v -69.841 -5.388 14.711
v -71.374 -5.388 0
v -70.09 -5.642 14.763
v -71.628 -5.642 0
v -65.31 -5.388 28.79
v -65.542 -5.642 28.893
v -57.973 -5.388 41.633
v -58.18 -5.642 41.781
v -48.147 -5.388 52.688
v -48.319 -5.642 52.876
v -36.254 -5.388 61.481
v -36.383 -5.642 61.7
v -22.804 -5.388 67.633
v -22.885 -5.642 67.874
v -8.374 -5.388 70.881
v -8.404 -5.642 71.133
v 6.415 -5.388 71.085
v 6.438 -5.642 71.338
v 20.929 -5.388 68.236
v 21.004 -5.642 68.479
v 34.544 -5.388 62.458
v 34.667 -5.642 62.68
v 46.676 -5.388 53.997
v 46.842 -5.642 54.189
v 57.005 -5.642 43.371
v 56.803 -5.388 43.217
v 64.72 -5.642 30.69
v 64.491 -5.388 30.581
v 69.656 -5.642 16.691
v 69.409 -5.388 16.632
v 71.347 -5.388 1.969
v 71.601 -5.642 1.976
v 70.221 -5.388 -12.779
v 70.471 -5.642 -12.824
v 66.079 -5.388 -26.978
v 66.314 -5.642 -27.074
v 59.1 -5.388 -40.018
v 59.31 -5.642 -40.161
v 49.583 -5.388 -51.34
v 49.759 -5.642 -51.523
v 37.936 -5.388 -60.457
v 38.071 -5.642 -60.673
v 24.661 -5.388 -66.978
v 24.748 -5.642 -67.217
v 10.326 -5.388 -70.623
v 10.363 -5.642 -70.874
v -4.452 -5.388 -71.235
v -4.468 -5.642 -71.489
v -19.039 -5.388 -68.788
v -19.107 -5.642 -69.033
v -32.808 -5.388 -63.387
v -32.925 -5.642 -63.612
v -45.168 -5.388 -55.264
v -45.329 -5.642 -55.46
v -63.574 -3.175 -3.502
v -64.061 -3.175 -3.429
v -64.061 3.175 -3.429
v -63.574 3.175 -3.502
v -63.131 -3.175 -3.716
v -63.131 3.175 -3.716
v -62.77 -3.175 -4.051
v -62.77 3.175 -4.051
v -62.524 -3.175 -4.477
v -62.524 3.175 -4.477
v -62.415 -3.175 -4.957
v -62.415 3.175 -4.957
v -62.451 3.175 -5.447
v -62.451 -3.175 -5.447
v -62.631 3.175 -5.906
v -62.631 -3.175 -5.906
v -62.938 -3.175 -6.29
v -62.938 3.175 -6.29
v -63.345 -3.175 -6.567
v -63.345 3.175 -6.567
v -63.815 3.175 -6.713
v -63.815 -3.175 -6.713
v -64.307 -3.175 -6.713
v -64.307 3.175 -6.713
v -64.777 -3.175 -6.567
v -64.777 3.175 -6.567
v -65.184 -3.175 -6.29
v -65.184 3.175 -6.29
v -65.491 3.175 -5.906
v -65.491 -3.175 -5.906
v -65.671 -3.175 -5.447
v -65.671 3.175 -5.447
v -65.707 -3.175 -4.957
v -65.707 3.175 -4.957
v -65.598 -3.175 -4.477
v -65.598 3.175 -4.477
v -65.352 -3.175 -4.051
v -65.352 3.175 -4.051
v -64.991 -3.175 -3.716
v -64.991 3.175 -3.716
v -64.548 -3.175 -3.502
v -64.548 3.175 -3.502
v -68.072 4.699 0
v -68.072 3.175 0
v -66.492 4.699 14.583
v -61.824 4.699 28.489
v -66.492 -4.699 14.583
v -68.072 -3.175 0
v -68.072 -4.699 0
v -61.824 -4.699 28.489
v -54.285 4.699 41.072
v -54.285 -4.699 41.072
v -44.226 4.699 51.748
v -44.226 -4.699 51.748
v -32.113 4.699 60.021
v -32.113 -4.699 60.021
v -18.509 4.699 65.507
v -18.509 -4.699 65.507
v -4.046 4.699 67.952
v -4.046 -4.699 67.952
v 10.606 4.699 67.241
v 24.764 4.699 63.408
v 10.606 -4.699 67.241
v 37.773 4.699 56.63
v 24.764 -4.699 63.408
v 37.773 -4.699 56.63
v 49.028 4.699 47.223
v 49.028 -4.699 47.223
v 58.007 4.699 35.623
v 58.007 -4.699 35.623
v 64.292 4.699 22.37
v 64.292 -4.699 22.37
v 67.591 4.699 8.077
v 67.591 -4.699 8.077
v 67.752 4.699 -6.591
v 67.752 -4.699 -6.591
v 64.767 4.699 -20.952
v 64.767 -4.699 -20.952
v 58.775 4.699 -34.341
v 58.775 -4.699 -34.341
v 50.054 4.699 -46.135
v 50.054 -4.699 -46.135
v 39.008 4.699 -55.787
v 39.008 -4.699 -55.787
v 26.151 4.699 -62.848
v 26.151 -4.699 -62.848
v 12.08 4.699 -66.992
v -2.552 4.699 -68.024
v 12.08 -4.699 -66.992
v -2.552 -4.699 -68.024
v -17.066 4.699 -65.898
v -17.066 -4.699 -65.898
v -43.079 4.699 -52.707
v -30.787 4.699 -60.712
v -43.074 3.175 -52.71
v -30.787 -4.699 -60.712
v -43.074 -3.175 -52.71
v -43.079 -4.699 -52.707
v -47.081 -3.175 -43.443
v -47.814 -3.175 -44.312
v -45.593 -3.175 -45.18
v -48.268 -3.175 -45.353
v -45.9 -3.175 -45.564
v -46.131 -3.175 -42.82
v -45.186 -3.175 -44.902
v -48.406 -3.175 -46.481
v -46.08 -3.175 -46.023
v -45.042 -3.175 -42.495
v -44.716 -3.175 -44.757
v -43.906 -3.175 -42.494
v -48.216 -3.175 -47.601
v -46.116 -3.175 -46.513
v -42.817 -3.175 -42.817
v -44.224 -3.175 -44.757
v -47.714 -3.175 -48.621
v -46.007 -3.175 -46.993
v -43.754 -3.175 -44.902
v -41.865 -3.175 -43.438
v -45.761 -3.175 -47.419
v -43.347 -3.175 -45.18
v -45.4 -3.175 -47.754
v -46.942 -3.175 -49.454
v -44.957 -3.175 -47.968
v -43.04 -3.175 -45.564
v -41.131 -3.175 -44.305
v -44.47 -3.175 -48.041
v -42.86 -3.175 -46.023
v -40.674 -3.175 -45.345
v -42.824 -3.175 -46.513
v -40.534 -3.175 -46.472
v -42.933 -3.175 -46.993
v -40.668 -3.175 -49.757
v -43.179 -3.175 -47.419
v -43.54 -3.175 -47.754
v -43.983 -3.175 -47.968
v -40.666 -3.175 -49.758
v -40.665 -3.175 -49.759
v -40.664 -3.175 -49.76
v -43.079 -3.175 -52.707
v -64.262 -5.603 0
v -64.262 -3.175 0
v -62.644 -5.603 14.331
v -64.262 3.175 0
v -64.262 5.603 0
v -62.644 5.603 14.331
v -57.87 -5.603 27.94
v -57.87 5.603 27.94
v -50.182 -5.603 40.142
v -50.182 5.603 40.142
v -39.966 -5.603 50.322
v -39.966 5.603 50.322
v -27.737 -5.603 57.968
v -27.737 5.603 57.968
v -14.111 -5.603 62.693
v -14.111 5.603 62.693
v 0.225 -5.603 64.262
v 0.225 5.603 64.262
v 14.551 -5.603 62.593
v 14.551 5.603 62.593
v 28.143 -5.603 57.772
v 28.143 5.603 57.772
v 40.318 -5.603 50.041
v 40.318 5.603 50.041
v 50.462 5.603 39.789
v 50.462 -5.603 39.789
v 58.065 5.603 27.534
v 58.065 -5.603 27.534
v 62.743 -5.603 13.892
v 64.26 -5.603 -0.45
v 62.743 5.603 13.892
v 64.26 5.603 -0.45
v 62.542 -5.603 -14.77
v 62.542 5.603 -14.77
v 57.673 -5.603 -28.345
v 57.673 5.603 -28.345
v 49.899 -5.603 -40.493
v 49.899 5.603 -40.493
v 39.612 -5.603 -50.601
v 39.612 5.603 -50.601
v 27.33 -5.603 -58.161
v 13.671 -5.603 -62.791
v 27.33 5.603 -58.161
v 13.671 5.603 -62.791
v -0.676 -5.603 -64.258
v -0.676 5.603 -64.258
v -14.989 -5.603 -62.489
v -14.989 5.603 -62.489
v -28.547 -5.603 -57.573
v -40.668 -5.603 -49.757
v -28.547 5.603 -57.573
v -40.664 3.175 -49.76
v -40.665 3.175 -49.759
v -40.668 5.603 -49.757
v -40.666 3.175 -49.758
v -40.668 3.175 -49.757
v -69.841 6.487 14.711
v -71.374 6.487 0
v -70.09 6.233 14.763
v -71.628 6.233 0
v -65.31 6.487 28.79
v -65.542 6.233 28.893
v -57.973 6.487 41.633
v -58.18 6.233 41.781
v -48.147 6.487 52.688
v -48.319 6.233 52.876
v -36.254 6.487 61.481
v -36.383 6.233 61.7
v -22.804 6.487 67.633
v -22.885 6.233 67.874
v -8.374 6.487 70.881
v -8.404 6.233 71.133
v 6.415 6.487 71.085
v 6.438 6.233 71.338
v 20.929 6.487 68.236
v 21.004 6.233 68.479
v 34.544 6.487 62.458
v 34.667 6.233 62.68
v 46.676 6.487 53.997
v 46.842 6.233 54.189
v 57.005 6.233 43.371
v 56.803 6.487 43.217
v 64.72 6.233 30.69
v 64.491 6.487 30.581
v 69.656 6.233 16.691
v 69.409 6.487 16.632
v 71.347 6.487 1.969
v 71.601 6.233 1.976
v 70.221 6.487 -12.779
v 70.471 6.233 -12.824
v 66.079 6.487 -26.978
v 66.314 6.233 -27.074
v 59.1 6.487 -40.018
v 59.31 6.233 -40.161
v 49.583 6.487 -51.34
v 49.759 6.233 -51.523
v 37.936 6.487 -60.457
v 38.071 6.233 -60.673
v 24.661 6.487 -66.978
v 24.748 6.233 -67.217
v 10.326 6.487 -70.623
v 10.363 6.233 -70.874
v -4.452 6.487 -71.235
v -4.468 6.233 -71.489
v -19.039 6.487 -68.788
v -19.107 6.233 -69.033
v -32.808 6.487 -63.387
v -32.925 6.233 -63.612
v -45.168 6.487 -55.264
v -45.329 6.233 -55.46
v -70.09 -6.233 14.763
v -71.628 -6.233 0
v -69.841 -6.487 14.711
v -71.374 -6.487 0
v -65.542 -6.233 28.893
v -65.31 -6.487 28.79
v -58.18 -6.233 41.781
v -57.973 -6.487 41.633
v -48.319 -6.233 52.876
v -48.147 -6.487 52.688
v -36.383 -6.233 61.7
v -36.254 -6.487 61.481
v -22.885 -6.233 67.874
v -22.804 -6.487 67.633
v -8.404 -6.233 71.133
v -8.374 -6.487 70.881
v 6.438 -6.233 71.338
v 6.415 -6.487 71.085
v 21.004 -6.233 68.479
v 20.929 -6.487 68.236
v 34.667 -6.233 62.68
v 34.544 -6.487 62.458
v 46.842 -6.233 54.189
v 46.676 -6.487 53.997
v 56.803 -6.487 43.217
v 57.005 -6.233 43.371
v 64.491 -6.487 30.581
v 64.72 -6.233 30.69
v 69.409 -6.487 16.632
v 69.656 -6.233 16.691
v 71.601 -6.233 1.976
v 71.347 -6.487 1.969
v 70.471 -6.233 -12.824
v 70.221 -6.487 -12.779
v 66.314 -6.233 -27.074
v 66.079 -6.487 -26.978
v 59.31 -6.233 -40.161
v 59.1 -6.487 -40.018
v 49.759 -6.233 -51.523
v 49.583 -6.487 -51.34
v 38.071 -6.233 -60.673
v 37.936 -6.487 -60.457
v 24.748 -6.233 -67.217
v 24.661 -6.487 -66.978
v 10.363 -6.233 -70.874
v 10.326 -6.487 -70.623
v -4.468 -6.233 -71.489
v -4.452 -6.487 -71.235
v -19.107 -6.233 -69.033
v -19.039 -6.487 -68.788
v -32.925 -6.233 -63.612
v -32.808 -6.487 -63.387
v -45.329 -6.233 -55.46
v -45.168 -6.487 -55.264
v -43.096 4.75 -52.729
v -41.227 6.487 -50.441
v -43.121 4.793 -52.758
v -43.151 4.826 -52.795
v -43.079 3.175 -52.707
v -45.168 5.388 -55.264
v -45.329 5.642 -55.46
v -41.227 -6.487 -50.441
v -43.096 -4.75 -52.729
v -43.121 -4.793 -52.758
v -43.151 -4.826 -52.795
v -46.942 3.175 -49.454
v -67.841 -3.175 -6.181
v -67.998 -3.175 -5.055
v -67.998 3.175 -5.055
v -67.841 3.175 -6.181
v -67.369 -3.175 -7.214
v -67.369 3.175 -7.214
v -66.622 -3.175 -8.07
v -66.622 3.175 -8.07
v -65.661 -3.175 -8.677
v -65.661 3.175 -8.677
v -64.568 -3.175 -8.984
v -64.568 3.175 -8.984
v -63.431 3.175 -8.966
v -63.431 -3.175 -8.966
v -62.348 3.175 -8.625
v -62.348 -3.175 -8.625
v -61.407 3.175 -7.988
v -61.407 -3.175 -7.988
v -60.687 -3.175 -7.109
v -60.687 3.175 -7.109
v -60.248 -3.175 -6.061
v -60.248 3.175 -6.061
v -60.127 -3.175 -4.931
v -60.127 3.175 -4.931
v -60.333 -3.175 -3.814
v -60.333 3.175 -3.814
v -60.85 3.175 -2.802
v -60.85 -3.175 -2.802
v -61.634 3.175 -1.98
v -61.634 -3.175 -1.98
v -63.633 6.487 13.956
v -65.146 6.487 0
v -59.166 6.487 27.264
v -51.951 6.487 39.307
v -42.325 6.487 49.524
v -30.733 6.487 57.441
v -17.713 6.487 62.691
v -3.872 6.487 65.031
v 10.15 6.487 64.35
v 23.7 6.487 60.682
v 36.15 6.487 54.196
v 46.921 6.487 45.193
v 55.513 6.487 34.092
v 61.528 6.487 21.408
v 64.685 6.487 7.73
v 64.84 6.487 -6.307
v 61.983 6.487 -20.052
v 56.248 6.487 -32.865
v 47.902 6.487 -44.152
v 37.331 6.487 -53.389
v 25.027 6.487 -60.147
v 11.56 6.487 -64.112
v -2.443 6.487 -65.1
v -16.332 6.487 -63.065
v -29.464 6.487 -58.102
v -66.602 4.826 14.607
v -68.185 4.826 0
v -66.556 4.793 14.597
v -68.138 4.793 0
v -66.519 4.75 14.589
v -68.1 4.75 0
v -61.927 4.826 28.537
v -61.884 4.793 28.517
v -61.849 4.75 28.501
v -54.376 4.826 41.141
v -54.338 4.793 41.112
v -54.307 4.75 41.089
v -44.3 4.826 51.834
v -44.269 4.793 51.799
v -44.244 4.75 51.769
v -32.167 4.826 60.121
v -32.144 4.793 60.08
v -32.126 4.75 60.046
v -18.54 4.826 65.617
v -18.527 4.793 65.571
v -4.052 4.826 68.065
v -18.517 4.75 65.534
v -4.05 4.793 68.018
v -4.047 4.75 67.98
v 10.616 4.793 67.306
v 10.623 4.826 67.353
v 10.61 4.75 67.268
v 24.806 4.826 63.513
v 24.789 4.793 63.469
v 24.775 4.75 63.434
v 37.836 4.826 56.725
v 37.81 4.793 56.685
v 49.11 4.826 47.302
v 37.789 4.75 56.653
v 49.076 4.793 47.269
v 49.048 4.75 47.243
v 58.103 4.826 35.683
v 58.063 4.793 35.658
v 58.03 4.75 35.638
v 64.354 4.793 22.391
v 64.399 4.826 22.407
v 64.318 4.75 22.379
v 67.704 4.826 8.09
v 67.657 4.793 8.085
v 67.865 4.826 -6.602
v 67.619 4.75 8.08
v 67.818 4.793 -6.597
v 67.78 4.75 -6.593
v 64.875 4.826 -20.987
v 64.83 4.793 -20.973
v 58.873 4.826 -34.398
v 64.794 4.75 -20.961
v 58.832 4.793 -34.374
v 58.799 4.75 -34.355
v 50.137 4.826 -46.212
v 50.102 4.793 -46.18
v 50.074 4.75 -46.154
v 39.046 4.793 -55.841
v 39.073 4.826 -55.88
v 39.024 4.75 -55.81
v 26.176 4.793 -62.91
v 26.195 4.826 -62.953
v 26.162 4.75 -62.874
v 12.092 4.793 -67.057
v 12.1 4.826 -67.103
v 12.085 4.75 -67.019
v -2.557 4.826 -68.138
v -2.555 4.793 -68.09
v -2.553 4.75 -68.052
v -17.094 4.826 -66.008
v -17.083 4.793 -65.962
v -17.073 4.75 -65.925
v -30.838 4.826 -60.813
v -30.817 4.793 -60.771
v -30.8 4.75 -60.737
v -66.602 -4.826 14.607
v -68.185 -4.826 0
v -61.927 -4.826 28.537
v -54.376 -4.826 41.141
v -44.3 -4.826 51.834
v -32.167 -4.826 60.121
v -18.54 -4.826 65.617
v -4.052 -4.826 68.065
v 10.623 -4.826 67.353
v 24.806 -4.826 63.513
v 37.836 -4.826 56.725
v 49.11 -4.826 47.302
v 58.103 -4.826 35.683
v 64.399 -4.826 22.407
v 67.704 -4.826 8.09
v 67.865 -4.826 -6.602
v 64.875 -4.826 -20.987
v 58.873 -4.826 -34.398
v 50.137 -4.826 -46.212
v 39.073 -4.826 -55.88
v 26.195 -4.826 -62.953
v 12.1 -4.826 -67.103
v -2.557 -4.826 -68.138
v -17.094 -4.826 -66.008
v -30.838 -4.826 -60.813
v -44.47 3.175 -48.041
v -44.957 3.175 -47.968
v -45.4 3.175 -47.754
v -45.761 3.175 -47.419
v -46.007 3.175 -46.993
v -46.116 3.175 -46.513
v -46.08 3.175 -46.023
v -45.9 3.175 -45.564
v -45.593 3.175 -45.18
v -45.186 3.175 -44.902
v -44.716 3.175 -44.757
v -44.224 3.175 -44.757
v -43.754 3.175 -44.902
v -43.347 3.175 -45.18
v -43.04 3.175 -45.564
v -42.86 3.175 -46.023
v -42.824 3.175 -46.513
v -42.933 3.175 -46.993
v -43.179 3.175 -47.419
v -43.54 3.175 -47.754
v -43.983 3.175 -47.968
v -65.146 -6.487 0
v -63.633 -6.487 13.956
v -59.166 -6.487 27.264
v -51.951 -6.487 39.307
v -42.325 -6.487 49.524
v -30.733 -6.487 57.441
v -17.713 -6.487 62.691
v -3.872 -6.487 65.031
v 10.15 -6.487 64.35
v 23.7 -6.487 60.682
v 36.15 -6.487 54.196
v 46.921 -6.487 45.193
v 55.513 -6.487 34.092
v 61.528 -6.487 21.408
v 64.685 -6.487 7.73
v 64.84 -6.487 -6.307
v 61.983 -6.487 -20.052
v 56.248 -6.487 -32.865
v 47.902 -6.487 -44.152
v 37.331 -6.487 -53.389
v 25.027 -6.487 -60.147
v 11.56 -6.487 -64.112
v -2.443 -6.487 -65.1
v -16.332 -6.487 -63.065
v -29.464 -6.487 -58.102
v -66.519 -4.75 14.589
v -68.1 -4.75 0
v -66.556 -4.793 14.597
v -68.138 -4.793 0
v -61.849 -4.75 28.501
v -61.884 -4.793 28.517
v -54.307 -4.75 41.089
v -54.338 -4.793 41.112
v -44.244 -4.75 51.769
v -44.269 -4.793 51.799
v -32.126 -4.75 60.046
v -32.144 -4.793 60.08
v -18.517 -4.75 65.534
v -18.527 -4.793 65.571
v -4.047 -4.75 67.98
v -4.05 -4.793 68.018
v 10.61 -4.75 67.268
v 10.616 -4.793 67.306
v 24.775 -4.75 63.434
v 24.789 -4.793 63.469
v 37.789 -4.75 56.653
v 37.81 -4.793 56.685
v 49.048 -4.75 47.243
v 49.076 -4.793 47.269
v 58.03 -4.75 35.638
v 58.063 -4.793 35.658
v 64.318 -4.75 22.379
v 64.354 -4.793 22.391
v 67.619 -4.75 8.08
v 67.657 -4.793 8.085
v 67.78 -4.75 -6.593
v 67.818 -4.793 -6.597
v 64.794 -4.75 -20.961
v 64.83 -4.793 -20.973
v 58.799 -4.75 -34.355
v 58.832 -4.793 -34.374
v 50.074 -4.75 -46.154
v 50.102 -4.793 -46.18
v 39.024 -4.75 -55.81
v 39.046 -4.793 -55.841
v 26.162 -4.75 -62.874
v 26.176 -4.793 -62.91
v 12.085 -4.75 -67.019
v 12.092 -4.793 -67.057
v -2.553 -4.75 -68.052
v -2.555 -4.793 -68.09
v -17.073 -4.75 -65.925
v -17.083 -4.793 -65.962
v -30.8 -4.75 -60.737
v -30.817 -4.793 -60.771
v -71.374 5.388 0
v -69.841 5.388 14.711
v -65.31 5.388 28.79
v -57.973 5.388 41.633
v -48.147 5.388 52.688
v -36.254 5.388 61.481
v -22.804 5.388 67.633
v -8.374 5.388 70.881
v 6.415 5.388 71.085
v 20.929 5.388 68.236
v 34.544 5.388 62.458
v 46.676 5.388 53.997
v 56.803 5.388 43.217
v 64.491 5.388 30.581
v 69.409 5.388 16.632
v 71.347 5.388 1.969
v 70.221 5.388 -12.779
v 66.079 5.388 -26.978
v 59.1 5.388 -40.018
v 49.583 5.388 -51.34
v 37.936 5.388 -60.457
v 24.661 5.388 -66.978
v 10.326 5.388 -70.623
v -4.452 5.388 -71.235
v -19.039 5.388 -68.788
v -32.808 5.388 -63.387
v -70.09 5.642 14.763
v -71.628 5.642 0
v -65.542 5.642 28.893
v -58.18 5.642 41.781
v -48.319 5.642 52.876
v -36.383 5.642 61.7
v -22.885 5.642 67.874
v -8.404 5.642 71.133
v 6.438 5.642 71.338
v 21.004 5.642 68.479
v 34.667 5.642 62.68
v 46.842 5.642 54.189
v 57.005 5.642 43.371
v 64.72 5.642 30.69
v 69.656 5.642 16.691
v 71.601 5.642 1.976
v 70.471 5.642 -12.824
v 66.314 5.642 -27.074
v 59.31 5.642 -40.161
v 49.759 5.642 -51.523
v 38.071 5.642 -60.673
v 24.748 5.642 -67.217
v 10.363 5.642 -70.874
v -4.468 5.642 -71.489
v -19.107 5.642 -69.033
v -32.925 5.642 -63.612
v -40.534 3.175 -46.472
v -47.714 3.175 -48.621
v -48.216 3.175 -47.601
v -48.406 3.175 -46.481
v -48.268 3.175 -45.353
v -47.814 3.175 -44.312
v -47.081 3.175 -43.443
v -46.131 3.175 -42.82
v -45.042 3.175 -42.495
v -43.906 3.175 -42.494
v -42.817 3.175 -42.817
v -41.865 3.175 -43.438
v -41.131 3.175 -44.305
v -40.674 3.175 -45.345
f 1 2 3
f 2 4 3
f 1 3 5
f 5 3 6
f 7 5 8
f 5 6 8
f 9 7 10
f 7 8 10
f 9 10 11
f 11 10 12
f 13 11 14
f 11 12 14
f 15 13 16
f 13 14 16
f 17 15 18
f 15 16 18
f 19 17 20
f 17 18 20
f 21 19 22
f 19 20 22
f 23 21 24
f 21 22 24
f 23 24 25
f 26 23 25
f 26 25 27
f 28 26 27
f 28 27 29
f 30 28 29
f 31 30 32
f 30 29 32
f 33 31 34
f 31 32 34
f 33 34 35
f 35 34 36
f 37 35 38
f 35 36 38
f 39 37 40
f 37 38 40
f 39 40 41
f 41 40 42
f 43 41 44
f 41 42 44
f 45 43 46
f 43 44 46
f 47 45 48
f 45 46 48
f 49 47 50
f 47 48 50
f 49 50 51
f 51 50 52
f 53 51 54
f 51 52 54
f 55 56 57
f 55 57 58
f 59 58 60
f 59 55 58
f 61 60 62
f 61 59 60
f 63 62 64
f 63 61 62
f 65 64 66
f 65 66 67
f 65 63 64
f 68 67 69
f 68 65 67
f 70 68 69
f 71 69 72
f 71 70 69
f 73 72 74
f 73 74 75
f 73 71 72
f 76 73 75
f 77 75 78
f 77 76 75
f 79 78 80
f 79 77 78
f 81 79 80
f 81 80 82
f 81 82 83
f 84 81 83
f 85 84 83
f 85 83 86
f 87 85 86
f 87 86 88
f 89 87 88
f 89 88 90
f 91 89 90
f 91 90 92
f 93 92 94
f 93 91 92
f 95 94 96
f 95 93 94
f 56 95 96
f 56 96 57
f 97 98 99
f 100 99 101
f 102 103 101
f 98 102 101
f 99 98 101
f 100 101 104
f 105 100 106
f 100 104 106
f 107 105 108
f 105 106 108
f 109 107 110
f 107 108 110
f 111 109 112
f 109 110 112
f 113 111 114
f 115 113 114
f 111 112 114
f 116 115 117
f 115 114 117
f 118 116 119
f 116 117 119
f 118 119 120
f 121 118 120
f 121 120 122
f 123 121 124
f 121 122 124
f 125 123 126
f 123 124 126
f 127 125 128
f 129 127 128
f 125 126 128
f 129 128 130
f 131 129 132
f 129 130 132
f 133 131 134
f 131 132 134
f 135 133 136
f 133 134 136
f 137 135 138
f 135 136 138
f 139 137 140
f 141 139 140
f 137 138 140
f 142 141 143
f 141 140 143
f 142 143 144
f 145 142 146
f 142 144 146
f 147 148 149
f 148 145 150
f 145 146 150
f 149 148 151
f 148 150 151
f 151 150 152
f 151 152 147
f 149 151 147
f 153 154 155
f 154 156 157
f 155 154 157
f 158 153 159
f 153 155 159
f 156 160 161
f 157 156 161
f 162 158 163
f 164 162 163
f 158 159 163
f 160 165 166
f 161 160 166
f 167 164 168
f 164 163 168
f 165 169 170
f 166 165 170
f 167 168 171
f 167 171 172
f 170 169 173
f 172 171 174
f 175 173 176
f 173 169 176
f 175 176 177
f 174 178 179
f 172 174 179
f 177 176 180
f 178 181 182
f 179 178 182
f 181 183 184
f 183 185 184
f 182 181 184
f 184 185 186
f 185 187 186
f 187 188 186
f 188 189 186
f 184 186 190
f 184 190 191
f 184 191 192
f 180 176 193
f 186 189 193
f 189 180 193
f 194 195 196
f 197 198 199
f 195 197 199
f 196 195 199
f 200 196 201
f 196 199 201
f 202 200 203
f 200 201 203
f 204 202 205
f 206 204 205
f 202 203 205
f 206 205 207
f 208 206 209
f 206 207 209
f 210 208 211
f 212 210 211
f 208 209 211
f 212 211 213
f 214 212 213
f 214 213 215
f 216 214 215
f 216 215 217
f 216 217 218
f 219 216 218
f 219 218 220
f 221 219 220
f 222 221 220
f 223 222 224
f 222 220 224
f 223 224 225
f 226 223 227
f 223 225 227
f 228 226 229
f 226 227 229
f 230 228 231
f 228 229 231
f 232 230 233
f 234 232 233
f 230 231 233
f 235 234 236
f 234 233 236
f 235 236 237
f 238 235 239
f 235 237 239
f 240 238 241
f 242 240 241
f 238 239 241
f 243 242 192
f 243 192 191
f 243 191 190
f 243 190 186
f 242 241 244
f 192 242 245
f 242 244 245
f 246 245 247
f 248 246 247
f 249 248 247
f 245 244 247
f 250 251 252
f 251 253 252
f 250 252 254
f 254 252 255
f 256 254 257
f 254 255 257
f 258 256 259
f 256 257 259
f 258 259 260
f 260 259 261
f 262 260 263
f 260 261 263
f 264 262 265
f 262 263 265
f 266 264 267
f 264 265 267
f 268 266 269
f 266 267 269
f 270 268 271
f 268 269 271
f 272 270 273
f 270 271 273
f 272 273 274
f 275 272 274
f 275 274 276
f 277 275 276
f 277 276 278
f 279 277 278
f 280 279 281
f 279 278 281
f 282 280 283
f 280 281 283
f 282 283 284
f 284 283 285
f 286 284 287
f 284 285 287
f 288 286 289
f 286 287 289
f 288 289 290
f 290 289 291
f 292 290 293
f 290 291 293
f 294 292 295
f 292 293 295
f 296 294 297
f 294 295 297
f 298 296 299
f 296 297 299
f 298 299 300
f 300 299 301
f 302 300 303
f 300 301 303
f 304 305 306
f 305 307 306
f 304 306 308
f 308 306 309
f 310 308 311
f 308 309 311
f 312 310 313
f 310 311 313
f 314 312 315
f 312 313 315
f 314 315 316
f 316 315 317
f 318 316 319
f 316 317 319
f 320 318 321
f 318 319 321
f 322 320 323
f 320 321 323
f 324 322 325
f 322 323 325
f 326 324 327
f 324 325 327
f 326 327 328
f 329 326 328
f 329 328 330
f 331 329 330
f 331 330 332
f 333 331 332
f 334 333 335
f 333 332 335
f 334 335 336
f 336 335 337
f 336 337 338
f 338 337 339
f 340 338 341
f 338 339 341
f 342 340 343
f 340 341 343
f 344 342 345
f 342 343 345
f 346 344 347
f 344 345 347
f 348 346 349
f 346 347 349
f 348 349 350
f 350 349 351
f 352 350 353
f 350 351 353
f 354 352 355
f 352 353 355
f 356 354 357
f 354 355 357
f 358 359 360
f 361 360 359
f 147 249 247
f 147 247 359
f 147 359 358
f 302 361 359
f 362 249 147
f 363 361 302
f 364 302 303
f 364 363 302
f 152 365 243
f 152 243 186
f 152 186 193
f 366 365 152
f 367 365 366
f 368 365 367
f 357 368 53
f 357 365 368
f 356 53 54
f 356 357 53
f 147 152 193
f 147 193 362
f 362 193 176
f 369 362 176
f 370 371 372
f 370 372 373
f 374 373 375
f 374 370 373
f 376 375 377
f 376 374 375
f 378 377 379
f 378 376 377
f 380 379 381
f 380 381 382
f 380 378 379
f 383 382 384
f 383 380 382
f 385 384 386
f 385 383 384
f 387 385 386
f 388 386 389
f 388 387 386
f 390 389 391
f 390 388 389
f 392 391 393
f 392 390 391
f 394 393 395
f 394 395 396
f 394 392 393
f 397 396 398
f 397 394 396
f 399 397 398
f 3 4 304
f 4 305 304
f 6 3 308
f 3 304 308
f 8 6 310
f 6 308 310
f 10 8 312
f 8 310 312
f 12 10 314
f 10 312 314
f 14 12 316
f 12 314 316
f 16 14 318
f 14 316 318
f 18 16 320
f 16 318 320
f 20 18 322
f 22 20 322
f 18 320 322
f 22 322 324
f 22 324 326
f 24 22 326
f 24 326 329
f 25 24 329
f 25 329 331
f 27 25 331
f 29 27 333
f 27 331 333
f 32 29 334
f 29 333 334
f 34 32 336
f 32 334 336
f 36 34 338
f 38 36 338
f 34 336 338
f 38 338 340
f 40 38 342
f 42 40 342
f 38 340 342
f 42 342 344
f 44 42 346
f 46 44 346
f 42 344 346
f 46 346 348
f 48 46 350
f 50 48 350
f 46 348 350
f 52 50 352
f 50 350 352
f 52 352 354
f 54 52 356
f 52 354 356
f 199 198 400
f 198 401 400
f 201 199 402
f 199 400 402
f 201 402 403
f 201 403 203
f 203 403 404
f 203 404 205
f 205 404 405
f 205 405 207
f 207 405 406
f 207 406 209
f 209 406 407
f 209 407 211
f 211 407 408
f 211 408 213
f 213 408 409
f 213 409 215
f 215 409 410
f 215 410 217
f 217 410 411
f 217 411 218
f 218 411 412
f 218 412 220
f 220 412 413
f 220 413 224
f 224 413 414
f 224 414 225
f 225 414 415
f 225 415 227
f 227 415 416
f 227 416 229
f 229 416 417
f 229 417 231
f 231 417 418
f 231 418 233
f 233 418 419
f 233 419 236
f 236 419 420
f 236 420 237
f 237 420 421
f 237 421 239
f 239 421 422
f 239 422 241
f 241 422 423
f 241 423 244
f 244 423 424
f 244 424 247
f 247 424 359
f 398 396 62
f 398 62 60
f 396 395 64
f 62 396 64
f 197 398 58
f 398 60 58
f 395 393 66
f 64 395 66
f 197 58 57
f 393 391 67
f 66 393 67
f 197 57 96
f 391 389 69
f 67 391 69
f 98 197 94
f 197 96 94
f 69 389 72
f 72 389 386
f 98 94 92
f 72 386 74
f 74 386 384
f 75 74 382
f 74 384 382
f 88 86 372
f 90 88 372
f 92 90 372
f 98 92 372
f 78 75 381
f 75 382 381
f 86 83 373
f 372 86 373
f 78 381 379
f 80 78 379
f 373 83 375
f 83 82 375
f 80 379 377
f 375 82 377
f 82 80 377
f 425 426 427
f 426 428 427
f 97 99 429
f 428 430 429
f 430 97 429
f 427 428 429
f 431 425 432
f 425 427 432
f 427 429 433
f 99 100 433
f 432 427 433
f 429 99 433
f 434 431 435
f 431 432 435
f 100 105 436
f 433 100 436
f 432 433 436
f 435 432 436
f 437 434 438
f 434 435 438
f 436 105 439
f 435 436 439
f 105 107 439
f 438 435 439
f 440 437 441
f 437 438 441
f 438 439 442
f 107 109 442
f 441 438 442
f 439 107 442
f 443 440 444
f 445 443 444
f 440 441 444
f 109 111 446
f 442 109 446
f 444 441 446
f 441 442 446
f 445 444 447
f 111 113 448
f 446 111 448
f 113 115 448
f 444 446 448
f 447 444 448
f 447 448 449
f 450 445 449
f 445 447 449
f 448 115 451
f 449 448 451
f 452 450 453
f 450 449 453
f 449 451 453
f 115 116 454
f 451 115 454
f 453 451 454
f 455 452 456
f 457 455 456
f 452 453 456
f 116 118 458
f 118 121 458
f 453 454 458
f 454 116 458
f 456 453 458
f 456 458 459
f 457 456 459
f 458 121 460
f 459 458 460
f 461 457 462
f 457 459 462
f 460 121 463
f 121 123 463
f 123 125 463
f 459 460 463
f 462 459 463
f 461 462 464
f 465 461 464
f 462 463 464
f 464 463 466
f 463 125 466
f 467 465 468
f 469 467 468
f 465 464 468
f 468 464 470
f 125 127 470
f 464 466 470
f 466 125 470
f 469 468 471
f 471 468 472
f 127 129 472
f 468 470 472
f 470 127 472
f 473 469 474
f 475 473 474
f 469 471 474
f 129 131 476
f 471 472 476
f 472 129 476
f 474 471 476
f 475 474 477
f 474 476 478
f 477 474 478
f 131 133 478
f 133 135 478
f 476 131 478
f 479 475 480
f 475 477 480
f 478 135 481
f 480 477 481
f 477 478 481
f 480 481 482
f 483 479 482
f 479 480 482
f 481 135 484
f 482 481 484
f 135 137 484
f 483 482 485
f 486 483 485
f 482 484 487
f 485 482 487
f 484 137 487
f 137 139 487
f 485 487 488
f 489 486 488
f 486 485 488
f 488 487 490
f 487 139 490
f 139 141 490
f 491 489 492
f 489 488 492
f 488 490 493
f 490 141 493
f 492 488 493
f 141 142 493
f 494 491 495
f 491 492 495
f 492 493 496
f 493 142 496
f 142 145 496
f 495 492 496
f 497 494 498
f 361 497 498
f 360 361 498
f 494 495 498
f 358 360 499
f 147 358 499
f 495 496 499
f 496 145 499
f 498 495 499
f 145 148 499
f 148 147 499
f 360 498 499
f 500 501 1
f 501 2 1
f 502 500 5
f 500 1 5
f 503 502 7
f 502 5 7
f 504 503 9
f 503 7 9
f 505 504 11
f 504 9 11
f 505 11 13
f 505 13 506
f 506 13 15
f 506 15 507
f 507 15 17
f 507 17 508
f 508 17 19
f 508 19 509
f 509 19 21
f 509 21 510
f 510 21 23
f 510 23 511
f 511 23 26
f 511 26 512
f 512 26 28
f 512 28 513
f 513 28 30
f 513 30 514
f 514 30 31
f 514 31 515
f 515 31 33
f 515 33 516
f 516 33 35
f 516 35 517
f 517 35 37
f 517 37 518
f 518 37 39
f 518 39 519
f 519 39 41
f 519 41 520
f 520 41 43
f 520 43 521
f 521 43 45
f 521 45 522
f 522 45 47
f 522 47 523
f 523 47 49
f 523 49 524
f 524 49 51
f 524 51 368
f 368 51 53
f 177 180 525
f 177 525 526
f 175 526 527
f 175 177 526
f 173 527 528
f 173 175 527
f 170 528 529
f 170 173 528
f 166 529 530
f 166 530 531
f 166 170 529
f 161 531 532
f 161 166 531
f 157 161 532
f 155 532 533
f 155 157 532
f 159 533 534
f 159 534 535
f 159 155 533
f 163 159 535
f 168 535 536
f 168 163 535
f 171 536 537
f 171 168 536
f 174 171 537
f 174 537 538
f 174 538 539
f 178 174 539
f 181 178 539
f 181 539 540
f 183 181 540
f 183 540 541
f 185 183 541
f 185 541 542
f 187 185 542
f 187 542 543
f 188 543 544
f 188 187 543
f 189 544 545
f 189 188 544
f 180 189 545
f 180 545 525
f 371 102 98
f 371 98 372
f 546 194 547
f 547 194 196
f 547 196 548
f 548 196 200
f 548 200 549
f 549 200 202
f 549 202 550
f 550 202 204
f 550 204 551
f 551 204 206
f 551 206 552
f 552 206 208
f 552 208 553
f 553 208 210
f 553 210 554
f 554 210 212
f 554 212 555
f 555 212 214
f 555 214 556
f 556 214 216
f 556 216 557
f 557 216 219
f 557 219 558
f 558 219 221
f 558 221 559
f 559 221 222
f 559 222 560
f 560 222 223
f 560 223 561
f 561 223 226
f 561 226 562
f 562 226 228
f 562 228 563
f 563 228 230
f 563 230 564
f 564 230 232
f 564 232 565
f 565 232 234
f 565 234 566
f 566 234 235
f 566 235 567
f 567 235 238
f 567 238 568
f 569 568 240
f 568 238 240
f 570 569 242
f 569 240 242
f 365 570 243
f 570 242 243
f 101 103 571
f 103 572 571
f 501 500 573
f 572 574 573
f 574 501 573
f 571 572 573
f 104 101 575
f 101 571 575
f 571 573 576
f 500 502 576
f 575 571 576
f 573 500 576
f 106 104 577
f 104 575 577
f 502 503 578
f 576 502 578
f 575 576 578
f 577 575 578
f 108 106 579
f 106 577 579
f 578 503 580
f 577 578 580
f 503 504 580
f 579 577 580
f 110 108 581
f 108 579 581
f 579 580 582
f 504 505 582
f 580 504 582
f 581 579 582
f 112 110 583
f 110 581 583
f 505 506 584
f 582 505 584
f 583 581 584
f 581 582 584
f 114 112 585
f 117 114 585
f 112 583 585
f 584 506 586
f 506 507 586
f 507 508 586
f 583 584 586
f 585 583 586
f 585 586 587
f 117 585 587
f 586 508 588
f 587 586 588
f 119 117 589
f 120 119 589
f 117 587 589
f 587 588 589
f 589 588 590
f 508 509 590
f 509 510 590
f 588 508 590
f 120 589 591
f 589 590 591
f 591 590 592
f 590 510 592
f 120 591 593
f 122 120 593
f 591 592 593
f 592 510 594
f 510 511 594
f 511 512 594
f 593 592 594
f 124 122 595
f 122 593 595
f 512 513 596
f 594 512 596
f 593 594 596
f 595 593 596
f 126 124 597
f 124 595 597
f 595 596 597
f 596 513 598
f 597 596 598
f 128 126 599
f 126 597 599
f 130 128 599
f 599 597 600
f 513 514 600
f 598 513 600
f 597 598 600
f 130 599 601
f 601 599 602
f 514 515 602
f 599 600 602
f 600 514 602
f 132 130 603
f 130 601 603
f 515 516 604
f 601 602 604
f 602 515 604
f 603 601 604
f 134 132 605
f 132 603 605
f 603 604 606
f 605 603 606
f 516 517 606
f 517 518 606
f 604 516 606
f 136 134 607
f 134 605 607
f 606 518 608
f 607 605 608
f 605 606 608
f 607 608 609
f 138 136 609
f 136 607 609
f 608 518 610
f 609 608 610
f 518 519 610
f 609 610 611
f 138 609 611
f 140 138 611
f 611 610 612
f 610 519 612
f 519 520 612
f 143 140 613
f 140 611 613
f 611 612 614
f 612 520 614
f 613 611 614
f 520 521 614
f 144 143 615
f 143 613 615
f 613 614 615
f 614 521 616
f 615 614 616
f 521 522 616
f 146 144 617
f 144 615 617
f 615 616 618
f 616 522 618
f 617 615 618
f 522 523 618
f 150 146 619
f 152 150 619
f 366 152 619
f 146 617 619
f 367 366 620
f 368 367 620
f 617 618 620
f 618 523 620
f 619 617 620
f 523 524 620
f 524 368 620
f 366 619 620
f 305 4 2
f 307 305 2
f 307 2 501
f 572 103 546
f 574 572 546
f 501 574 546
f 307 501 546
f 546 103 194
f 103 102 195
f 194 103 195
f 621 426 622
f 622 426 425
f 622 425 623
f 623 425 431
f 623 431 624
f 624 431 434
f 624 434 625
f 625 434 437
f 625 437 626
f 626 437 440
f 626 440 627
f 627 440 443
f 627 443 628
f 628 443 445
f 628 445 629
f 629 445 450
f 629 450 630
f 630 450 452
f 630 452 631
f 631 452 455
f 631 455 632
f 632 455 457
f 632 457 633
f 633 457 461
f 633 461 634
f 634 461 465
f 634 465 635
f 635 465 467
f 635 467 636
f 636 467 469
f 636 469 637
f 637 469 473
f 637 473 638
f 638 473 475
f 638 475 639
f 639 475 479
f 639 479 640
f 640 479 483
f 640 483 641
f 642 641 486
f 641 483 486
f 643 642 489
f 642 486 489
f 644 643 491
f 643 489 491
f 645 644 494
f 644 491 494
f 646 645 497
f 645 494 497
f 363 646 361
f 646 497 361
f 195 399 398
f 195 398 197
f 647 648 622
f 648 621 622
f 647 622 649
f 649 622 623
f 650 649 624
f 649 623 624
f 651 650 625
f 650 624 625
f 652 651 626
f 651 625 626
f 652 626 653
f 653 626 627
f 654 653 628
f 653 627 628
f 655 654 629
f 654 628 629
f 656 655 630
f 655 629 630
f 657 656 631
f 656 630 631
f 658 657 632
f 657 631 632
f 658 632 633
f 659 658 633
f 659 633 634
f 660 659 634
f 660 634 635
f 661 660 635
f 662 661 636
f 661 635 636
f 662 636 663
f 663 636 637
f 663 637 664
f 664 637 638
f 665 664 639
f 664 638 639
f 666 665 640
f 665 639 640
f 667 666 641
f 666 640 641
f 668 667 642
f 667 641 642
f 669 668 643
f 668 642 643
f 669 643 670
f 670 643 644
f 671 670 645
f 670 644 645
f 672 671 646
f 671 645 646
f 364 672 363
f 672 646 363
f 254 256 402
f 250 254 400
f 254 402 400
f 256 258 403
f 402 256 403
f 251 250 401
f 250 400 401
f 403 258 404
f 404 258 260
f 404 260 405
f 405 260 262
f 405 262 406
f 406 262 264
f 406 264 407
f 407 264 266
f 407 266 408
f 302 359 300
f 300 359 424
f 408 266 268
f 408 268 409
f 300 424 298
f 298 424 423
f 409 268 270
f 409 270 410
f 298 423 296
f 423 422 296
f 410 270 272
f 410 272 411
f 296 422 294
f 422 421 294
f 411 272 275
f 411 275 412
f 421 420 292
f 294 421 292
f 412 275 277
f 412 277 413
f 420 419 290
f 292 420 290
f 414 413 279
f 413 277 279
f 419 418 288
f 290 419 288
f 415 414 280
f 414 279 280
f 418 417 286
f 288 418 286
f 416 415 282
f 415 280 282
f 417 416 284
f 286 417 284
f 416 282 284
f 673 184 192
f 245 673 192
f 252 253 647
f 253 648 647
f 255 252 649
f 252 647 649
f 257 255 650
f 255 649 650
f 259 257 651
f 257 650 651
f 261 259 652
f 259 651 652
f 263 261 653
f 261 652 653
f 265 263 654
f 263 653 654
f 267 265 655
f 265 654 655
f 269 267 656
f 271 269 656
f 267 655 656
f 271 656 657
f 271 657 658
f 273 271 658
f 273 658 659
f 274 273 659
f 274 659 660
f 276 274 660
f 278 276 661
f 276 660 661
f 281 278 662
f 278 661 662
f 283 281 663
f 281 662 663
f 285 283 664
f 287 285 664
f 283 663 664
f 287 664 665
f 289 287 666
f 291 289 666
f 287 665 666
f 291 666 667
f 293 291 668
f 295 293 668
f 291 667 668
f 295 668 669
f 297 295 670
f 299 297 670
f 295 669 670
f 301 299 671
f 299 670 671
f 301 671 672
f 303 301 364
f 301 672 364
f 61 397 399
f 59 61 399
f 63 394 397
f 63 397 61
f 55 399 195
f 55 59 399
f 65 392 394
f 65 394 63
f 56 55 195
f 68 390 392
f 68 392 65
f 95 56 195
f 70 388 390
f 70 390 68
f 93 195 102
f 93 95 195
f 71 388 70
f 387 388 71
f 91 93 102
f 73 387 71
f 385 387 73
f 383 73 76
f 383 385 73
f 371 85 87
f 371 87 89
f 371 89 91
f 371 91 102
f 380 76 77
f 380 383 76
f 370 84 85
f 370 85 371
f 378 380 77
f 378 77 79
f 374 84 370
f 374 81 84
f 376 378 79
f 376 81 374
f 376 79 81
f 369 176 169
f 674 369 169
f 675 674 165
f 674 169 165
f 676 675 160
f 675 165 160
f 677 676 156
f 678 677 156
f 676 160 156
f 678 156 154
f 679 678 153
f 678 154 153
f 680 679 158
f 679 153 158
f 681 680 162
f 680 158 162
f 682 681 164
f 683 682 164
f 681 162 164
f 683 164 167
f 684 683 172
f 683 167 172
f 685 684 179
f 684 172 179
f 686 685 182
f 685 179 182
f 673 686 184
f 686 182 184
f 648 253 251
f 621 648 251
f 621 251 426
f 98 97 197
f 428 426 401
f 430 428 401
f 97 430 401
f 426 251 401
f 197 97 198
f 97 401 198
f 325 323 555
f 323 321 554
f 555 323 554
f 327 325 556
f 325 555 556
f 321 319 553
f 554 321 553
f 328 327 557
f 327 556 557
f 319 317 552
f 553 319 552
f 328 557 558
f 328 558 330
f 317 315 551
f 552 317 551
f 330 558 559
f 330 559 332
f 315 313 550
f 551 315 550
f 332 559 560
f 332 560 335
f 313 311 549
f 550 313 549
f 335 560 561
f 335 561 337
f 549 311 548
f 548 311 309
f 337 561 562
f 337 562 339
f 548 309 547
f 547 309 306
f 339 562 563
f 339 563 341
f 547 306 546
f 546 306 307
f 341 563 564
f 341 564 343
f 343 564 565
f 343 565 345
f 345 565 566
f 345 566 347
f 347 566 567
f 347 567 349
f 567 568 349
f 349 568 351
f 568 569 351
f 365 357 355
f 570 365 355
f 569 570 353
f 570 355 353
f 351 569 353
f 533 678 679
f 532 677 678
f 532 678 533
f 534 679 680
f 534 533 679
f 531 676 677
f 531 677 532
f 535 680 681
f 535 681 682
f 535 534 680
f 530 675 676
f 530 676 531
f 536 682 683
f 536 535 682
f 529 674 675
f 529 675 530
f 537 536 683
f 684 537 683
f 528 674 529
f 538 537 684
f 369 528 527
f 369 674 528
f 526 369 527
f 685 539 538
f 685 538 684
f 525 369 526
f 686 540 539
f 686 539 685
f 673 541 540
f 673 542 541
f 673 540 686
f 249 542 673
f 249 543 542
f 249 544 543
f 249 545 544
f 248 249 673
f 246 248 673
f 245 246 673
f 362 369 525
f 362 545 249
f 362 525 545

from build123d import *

# Parameters (mm, degrees)
BOSS_EXTRUDE2_DEPTH      = 3.175
BOSS_EXTRUDE2_DEPTH_BACK = 3.175
SKETCH5_R                = 1.651


with BuildPart() as part:
    # Sweep2: sweep along a path in Sketch4
    with BuildLine(Plane(origin=(0, 0, 0), x_dir=(1, 0, 0), z_dir=(0, 1, 0))) as sweep2_path:
        ThreePointArc((-66.167, 0), (59.78583857, -28.350051068), (-41.873155771, 51.231930617))
    # Sketch1 → Sweep2 (sweep)
    with BuildSketch(Plane.XY):
        with BuildLine():
            Line((-68.072, 4.699), (-68.072, -4.699))
            ThreePointArc((-68.072, -4.699), (-68.117948863, -4.772140282), (-68.185476115, -4.826))
            Line((-68.185476115, -4.826), (-71.374, -5.38822279))
            Line((-71.374, -5.38822279), (-71.628, -5.64222279))
            Line((-71.628, -5.64222279), (-71.628, -6.233150289))
            Line((-71.628, -6.233150289), (-71.374, -6.487150289))
            Line((-71.374, -6.487150289), (-65.145686506, -6.487150289))
            Line((-65.145686506, -6.487150289), (-64.262, -5.603463784))
            Line((-64.262, -5.603463784), (-64.262, 5.603463784))
            Line((-64.262, 5.603463784), (-65.145686506, 6.487150289))
            Line((-65.145686506, 6.487150289), (-71.374, 6.487150289))
            Line((-71.374, 6.487150289), (-71.628, 6.233150289))
            Line((-71.628, 6.233150289), (-71.628, 5.64222279))
            Line((-71.628, 5.64222279), (-71.374, 5.38822279))
            Line((-71.374, 5.38822279), (-68.185476115, 4.826))
            ThreePointArc((-68.185476115, 4.826), (-68.117948863, 4.772140282), (-68.072, 4.699))
        make_face()
    sweep(path=sweep2_path.line)

    # Sketch5 → Boss-Extrude2 (add, two sides: drawn at the far end of the back side and taken through both)
    # profile 1 of 2: a face of its own
    with BuildSketch(Plane(origin=(0, 0, 0), x_dir=(1, 0, 0), z_dir=(0, 1, 0)).offset(-BOSS_EXTRUDE2_DEPTH_BACK)):
        with BuildLine():
            Line((-68.072, 0), (-67.997817291, 5.05529393))
            ThreePointArc((-67.997817291, 5.05529393), (-62.347816522, 8.624761173), (-61.63409996, 1.979897461))
            Line((-61.63409996, 1.979897461), (-64.262, 0))
            Line((-64.262, 0), (-68.072, 0))
        make_face()
        with Locations(Location((-64.060894811, 5.08, 0), (0, 0, 270))):
            Circle(SKETCH5_R, mode=Mode.SUBTRACT)
    # profile 2 of 2: a face of its own
    with BuildSketch(Plane(origin=(0, 0, 0), x_dir=(1, 0, 0), z_dir=(0, 1, 0)).offset(-BOSS_EXTRUDE2_DEPTH_BACK)):
        with BuildLine():
            Line((-40.533809509, 46.472492493), (-40.663586841, 49.760198444))
            Line((-40.663586841, 49.760198444), (-43.074471436, 52.710407838))
            Line((-43.074471436, 52.710407838), (-46.942012037, 49.454086372))
            ThreePointArc((-46.942012037, 49.454086372), (-46.130772136, 42.82042261), (-40.533809509, 46.472492493))
        make_face()
        with Locations(Location((-44.469944405, 46.389963231, 0), (0, 0, 90))):
            Circle(SKETCH5_R, mode=Mode.SUBTRACT)
    extrude(amount=BOSS_EXTRUDE2_DEPTH + BOSS_EXTRUDE2_DEPTH_BACK)


solid = part.part
